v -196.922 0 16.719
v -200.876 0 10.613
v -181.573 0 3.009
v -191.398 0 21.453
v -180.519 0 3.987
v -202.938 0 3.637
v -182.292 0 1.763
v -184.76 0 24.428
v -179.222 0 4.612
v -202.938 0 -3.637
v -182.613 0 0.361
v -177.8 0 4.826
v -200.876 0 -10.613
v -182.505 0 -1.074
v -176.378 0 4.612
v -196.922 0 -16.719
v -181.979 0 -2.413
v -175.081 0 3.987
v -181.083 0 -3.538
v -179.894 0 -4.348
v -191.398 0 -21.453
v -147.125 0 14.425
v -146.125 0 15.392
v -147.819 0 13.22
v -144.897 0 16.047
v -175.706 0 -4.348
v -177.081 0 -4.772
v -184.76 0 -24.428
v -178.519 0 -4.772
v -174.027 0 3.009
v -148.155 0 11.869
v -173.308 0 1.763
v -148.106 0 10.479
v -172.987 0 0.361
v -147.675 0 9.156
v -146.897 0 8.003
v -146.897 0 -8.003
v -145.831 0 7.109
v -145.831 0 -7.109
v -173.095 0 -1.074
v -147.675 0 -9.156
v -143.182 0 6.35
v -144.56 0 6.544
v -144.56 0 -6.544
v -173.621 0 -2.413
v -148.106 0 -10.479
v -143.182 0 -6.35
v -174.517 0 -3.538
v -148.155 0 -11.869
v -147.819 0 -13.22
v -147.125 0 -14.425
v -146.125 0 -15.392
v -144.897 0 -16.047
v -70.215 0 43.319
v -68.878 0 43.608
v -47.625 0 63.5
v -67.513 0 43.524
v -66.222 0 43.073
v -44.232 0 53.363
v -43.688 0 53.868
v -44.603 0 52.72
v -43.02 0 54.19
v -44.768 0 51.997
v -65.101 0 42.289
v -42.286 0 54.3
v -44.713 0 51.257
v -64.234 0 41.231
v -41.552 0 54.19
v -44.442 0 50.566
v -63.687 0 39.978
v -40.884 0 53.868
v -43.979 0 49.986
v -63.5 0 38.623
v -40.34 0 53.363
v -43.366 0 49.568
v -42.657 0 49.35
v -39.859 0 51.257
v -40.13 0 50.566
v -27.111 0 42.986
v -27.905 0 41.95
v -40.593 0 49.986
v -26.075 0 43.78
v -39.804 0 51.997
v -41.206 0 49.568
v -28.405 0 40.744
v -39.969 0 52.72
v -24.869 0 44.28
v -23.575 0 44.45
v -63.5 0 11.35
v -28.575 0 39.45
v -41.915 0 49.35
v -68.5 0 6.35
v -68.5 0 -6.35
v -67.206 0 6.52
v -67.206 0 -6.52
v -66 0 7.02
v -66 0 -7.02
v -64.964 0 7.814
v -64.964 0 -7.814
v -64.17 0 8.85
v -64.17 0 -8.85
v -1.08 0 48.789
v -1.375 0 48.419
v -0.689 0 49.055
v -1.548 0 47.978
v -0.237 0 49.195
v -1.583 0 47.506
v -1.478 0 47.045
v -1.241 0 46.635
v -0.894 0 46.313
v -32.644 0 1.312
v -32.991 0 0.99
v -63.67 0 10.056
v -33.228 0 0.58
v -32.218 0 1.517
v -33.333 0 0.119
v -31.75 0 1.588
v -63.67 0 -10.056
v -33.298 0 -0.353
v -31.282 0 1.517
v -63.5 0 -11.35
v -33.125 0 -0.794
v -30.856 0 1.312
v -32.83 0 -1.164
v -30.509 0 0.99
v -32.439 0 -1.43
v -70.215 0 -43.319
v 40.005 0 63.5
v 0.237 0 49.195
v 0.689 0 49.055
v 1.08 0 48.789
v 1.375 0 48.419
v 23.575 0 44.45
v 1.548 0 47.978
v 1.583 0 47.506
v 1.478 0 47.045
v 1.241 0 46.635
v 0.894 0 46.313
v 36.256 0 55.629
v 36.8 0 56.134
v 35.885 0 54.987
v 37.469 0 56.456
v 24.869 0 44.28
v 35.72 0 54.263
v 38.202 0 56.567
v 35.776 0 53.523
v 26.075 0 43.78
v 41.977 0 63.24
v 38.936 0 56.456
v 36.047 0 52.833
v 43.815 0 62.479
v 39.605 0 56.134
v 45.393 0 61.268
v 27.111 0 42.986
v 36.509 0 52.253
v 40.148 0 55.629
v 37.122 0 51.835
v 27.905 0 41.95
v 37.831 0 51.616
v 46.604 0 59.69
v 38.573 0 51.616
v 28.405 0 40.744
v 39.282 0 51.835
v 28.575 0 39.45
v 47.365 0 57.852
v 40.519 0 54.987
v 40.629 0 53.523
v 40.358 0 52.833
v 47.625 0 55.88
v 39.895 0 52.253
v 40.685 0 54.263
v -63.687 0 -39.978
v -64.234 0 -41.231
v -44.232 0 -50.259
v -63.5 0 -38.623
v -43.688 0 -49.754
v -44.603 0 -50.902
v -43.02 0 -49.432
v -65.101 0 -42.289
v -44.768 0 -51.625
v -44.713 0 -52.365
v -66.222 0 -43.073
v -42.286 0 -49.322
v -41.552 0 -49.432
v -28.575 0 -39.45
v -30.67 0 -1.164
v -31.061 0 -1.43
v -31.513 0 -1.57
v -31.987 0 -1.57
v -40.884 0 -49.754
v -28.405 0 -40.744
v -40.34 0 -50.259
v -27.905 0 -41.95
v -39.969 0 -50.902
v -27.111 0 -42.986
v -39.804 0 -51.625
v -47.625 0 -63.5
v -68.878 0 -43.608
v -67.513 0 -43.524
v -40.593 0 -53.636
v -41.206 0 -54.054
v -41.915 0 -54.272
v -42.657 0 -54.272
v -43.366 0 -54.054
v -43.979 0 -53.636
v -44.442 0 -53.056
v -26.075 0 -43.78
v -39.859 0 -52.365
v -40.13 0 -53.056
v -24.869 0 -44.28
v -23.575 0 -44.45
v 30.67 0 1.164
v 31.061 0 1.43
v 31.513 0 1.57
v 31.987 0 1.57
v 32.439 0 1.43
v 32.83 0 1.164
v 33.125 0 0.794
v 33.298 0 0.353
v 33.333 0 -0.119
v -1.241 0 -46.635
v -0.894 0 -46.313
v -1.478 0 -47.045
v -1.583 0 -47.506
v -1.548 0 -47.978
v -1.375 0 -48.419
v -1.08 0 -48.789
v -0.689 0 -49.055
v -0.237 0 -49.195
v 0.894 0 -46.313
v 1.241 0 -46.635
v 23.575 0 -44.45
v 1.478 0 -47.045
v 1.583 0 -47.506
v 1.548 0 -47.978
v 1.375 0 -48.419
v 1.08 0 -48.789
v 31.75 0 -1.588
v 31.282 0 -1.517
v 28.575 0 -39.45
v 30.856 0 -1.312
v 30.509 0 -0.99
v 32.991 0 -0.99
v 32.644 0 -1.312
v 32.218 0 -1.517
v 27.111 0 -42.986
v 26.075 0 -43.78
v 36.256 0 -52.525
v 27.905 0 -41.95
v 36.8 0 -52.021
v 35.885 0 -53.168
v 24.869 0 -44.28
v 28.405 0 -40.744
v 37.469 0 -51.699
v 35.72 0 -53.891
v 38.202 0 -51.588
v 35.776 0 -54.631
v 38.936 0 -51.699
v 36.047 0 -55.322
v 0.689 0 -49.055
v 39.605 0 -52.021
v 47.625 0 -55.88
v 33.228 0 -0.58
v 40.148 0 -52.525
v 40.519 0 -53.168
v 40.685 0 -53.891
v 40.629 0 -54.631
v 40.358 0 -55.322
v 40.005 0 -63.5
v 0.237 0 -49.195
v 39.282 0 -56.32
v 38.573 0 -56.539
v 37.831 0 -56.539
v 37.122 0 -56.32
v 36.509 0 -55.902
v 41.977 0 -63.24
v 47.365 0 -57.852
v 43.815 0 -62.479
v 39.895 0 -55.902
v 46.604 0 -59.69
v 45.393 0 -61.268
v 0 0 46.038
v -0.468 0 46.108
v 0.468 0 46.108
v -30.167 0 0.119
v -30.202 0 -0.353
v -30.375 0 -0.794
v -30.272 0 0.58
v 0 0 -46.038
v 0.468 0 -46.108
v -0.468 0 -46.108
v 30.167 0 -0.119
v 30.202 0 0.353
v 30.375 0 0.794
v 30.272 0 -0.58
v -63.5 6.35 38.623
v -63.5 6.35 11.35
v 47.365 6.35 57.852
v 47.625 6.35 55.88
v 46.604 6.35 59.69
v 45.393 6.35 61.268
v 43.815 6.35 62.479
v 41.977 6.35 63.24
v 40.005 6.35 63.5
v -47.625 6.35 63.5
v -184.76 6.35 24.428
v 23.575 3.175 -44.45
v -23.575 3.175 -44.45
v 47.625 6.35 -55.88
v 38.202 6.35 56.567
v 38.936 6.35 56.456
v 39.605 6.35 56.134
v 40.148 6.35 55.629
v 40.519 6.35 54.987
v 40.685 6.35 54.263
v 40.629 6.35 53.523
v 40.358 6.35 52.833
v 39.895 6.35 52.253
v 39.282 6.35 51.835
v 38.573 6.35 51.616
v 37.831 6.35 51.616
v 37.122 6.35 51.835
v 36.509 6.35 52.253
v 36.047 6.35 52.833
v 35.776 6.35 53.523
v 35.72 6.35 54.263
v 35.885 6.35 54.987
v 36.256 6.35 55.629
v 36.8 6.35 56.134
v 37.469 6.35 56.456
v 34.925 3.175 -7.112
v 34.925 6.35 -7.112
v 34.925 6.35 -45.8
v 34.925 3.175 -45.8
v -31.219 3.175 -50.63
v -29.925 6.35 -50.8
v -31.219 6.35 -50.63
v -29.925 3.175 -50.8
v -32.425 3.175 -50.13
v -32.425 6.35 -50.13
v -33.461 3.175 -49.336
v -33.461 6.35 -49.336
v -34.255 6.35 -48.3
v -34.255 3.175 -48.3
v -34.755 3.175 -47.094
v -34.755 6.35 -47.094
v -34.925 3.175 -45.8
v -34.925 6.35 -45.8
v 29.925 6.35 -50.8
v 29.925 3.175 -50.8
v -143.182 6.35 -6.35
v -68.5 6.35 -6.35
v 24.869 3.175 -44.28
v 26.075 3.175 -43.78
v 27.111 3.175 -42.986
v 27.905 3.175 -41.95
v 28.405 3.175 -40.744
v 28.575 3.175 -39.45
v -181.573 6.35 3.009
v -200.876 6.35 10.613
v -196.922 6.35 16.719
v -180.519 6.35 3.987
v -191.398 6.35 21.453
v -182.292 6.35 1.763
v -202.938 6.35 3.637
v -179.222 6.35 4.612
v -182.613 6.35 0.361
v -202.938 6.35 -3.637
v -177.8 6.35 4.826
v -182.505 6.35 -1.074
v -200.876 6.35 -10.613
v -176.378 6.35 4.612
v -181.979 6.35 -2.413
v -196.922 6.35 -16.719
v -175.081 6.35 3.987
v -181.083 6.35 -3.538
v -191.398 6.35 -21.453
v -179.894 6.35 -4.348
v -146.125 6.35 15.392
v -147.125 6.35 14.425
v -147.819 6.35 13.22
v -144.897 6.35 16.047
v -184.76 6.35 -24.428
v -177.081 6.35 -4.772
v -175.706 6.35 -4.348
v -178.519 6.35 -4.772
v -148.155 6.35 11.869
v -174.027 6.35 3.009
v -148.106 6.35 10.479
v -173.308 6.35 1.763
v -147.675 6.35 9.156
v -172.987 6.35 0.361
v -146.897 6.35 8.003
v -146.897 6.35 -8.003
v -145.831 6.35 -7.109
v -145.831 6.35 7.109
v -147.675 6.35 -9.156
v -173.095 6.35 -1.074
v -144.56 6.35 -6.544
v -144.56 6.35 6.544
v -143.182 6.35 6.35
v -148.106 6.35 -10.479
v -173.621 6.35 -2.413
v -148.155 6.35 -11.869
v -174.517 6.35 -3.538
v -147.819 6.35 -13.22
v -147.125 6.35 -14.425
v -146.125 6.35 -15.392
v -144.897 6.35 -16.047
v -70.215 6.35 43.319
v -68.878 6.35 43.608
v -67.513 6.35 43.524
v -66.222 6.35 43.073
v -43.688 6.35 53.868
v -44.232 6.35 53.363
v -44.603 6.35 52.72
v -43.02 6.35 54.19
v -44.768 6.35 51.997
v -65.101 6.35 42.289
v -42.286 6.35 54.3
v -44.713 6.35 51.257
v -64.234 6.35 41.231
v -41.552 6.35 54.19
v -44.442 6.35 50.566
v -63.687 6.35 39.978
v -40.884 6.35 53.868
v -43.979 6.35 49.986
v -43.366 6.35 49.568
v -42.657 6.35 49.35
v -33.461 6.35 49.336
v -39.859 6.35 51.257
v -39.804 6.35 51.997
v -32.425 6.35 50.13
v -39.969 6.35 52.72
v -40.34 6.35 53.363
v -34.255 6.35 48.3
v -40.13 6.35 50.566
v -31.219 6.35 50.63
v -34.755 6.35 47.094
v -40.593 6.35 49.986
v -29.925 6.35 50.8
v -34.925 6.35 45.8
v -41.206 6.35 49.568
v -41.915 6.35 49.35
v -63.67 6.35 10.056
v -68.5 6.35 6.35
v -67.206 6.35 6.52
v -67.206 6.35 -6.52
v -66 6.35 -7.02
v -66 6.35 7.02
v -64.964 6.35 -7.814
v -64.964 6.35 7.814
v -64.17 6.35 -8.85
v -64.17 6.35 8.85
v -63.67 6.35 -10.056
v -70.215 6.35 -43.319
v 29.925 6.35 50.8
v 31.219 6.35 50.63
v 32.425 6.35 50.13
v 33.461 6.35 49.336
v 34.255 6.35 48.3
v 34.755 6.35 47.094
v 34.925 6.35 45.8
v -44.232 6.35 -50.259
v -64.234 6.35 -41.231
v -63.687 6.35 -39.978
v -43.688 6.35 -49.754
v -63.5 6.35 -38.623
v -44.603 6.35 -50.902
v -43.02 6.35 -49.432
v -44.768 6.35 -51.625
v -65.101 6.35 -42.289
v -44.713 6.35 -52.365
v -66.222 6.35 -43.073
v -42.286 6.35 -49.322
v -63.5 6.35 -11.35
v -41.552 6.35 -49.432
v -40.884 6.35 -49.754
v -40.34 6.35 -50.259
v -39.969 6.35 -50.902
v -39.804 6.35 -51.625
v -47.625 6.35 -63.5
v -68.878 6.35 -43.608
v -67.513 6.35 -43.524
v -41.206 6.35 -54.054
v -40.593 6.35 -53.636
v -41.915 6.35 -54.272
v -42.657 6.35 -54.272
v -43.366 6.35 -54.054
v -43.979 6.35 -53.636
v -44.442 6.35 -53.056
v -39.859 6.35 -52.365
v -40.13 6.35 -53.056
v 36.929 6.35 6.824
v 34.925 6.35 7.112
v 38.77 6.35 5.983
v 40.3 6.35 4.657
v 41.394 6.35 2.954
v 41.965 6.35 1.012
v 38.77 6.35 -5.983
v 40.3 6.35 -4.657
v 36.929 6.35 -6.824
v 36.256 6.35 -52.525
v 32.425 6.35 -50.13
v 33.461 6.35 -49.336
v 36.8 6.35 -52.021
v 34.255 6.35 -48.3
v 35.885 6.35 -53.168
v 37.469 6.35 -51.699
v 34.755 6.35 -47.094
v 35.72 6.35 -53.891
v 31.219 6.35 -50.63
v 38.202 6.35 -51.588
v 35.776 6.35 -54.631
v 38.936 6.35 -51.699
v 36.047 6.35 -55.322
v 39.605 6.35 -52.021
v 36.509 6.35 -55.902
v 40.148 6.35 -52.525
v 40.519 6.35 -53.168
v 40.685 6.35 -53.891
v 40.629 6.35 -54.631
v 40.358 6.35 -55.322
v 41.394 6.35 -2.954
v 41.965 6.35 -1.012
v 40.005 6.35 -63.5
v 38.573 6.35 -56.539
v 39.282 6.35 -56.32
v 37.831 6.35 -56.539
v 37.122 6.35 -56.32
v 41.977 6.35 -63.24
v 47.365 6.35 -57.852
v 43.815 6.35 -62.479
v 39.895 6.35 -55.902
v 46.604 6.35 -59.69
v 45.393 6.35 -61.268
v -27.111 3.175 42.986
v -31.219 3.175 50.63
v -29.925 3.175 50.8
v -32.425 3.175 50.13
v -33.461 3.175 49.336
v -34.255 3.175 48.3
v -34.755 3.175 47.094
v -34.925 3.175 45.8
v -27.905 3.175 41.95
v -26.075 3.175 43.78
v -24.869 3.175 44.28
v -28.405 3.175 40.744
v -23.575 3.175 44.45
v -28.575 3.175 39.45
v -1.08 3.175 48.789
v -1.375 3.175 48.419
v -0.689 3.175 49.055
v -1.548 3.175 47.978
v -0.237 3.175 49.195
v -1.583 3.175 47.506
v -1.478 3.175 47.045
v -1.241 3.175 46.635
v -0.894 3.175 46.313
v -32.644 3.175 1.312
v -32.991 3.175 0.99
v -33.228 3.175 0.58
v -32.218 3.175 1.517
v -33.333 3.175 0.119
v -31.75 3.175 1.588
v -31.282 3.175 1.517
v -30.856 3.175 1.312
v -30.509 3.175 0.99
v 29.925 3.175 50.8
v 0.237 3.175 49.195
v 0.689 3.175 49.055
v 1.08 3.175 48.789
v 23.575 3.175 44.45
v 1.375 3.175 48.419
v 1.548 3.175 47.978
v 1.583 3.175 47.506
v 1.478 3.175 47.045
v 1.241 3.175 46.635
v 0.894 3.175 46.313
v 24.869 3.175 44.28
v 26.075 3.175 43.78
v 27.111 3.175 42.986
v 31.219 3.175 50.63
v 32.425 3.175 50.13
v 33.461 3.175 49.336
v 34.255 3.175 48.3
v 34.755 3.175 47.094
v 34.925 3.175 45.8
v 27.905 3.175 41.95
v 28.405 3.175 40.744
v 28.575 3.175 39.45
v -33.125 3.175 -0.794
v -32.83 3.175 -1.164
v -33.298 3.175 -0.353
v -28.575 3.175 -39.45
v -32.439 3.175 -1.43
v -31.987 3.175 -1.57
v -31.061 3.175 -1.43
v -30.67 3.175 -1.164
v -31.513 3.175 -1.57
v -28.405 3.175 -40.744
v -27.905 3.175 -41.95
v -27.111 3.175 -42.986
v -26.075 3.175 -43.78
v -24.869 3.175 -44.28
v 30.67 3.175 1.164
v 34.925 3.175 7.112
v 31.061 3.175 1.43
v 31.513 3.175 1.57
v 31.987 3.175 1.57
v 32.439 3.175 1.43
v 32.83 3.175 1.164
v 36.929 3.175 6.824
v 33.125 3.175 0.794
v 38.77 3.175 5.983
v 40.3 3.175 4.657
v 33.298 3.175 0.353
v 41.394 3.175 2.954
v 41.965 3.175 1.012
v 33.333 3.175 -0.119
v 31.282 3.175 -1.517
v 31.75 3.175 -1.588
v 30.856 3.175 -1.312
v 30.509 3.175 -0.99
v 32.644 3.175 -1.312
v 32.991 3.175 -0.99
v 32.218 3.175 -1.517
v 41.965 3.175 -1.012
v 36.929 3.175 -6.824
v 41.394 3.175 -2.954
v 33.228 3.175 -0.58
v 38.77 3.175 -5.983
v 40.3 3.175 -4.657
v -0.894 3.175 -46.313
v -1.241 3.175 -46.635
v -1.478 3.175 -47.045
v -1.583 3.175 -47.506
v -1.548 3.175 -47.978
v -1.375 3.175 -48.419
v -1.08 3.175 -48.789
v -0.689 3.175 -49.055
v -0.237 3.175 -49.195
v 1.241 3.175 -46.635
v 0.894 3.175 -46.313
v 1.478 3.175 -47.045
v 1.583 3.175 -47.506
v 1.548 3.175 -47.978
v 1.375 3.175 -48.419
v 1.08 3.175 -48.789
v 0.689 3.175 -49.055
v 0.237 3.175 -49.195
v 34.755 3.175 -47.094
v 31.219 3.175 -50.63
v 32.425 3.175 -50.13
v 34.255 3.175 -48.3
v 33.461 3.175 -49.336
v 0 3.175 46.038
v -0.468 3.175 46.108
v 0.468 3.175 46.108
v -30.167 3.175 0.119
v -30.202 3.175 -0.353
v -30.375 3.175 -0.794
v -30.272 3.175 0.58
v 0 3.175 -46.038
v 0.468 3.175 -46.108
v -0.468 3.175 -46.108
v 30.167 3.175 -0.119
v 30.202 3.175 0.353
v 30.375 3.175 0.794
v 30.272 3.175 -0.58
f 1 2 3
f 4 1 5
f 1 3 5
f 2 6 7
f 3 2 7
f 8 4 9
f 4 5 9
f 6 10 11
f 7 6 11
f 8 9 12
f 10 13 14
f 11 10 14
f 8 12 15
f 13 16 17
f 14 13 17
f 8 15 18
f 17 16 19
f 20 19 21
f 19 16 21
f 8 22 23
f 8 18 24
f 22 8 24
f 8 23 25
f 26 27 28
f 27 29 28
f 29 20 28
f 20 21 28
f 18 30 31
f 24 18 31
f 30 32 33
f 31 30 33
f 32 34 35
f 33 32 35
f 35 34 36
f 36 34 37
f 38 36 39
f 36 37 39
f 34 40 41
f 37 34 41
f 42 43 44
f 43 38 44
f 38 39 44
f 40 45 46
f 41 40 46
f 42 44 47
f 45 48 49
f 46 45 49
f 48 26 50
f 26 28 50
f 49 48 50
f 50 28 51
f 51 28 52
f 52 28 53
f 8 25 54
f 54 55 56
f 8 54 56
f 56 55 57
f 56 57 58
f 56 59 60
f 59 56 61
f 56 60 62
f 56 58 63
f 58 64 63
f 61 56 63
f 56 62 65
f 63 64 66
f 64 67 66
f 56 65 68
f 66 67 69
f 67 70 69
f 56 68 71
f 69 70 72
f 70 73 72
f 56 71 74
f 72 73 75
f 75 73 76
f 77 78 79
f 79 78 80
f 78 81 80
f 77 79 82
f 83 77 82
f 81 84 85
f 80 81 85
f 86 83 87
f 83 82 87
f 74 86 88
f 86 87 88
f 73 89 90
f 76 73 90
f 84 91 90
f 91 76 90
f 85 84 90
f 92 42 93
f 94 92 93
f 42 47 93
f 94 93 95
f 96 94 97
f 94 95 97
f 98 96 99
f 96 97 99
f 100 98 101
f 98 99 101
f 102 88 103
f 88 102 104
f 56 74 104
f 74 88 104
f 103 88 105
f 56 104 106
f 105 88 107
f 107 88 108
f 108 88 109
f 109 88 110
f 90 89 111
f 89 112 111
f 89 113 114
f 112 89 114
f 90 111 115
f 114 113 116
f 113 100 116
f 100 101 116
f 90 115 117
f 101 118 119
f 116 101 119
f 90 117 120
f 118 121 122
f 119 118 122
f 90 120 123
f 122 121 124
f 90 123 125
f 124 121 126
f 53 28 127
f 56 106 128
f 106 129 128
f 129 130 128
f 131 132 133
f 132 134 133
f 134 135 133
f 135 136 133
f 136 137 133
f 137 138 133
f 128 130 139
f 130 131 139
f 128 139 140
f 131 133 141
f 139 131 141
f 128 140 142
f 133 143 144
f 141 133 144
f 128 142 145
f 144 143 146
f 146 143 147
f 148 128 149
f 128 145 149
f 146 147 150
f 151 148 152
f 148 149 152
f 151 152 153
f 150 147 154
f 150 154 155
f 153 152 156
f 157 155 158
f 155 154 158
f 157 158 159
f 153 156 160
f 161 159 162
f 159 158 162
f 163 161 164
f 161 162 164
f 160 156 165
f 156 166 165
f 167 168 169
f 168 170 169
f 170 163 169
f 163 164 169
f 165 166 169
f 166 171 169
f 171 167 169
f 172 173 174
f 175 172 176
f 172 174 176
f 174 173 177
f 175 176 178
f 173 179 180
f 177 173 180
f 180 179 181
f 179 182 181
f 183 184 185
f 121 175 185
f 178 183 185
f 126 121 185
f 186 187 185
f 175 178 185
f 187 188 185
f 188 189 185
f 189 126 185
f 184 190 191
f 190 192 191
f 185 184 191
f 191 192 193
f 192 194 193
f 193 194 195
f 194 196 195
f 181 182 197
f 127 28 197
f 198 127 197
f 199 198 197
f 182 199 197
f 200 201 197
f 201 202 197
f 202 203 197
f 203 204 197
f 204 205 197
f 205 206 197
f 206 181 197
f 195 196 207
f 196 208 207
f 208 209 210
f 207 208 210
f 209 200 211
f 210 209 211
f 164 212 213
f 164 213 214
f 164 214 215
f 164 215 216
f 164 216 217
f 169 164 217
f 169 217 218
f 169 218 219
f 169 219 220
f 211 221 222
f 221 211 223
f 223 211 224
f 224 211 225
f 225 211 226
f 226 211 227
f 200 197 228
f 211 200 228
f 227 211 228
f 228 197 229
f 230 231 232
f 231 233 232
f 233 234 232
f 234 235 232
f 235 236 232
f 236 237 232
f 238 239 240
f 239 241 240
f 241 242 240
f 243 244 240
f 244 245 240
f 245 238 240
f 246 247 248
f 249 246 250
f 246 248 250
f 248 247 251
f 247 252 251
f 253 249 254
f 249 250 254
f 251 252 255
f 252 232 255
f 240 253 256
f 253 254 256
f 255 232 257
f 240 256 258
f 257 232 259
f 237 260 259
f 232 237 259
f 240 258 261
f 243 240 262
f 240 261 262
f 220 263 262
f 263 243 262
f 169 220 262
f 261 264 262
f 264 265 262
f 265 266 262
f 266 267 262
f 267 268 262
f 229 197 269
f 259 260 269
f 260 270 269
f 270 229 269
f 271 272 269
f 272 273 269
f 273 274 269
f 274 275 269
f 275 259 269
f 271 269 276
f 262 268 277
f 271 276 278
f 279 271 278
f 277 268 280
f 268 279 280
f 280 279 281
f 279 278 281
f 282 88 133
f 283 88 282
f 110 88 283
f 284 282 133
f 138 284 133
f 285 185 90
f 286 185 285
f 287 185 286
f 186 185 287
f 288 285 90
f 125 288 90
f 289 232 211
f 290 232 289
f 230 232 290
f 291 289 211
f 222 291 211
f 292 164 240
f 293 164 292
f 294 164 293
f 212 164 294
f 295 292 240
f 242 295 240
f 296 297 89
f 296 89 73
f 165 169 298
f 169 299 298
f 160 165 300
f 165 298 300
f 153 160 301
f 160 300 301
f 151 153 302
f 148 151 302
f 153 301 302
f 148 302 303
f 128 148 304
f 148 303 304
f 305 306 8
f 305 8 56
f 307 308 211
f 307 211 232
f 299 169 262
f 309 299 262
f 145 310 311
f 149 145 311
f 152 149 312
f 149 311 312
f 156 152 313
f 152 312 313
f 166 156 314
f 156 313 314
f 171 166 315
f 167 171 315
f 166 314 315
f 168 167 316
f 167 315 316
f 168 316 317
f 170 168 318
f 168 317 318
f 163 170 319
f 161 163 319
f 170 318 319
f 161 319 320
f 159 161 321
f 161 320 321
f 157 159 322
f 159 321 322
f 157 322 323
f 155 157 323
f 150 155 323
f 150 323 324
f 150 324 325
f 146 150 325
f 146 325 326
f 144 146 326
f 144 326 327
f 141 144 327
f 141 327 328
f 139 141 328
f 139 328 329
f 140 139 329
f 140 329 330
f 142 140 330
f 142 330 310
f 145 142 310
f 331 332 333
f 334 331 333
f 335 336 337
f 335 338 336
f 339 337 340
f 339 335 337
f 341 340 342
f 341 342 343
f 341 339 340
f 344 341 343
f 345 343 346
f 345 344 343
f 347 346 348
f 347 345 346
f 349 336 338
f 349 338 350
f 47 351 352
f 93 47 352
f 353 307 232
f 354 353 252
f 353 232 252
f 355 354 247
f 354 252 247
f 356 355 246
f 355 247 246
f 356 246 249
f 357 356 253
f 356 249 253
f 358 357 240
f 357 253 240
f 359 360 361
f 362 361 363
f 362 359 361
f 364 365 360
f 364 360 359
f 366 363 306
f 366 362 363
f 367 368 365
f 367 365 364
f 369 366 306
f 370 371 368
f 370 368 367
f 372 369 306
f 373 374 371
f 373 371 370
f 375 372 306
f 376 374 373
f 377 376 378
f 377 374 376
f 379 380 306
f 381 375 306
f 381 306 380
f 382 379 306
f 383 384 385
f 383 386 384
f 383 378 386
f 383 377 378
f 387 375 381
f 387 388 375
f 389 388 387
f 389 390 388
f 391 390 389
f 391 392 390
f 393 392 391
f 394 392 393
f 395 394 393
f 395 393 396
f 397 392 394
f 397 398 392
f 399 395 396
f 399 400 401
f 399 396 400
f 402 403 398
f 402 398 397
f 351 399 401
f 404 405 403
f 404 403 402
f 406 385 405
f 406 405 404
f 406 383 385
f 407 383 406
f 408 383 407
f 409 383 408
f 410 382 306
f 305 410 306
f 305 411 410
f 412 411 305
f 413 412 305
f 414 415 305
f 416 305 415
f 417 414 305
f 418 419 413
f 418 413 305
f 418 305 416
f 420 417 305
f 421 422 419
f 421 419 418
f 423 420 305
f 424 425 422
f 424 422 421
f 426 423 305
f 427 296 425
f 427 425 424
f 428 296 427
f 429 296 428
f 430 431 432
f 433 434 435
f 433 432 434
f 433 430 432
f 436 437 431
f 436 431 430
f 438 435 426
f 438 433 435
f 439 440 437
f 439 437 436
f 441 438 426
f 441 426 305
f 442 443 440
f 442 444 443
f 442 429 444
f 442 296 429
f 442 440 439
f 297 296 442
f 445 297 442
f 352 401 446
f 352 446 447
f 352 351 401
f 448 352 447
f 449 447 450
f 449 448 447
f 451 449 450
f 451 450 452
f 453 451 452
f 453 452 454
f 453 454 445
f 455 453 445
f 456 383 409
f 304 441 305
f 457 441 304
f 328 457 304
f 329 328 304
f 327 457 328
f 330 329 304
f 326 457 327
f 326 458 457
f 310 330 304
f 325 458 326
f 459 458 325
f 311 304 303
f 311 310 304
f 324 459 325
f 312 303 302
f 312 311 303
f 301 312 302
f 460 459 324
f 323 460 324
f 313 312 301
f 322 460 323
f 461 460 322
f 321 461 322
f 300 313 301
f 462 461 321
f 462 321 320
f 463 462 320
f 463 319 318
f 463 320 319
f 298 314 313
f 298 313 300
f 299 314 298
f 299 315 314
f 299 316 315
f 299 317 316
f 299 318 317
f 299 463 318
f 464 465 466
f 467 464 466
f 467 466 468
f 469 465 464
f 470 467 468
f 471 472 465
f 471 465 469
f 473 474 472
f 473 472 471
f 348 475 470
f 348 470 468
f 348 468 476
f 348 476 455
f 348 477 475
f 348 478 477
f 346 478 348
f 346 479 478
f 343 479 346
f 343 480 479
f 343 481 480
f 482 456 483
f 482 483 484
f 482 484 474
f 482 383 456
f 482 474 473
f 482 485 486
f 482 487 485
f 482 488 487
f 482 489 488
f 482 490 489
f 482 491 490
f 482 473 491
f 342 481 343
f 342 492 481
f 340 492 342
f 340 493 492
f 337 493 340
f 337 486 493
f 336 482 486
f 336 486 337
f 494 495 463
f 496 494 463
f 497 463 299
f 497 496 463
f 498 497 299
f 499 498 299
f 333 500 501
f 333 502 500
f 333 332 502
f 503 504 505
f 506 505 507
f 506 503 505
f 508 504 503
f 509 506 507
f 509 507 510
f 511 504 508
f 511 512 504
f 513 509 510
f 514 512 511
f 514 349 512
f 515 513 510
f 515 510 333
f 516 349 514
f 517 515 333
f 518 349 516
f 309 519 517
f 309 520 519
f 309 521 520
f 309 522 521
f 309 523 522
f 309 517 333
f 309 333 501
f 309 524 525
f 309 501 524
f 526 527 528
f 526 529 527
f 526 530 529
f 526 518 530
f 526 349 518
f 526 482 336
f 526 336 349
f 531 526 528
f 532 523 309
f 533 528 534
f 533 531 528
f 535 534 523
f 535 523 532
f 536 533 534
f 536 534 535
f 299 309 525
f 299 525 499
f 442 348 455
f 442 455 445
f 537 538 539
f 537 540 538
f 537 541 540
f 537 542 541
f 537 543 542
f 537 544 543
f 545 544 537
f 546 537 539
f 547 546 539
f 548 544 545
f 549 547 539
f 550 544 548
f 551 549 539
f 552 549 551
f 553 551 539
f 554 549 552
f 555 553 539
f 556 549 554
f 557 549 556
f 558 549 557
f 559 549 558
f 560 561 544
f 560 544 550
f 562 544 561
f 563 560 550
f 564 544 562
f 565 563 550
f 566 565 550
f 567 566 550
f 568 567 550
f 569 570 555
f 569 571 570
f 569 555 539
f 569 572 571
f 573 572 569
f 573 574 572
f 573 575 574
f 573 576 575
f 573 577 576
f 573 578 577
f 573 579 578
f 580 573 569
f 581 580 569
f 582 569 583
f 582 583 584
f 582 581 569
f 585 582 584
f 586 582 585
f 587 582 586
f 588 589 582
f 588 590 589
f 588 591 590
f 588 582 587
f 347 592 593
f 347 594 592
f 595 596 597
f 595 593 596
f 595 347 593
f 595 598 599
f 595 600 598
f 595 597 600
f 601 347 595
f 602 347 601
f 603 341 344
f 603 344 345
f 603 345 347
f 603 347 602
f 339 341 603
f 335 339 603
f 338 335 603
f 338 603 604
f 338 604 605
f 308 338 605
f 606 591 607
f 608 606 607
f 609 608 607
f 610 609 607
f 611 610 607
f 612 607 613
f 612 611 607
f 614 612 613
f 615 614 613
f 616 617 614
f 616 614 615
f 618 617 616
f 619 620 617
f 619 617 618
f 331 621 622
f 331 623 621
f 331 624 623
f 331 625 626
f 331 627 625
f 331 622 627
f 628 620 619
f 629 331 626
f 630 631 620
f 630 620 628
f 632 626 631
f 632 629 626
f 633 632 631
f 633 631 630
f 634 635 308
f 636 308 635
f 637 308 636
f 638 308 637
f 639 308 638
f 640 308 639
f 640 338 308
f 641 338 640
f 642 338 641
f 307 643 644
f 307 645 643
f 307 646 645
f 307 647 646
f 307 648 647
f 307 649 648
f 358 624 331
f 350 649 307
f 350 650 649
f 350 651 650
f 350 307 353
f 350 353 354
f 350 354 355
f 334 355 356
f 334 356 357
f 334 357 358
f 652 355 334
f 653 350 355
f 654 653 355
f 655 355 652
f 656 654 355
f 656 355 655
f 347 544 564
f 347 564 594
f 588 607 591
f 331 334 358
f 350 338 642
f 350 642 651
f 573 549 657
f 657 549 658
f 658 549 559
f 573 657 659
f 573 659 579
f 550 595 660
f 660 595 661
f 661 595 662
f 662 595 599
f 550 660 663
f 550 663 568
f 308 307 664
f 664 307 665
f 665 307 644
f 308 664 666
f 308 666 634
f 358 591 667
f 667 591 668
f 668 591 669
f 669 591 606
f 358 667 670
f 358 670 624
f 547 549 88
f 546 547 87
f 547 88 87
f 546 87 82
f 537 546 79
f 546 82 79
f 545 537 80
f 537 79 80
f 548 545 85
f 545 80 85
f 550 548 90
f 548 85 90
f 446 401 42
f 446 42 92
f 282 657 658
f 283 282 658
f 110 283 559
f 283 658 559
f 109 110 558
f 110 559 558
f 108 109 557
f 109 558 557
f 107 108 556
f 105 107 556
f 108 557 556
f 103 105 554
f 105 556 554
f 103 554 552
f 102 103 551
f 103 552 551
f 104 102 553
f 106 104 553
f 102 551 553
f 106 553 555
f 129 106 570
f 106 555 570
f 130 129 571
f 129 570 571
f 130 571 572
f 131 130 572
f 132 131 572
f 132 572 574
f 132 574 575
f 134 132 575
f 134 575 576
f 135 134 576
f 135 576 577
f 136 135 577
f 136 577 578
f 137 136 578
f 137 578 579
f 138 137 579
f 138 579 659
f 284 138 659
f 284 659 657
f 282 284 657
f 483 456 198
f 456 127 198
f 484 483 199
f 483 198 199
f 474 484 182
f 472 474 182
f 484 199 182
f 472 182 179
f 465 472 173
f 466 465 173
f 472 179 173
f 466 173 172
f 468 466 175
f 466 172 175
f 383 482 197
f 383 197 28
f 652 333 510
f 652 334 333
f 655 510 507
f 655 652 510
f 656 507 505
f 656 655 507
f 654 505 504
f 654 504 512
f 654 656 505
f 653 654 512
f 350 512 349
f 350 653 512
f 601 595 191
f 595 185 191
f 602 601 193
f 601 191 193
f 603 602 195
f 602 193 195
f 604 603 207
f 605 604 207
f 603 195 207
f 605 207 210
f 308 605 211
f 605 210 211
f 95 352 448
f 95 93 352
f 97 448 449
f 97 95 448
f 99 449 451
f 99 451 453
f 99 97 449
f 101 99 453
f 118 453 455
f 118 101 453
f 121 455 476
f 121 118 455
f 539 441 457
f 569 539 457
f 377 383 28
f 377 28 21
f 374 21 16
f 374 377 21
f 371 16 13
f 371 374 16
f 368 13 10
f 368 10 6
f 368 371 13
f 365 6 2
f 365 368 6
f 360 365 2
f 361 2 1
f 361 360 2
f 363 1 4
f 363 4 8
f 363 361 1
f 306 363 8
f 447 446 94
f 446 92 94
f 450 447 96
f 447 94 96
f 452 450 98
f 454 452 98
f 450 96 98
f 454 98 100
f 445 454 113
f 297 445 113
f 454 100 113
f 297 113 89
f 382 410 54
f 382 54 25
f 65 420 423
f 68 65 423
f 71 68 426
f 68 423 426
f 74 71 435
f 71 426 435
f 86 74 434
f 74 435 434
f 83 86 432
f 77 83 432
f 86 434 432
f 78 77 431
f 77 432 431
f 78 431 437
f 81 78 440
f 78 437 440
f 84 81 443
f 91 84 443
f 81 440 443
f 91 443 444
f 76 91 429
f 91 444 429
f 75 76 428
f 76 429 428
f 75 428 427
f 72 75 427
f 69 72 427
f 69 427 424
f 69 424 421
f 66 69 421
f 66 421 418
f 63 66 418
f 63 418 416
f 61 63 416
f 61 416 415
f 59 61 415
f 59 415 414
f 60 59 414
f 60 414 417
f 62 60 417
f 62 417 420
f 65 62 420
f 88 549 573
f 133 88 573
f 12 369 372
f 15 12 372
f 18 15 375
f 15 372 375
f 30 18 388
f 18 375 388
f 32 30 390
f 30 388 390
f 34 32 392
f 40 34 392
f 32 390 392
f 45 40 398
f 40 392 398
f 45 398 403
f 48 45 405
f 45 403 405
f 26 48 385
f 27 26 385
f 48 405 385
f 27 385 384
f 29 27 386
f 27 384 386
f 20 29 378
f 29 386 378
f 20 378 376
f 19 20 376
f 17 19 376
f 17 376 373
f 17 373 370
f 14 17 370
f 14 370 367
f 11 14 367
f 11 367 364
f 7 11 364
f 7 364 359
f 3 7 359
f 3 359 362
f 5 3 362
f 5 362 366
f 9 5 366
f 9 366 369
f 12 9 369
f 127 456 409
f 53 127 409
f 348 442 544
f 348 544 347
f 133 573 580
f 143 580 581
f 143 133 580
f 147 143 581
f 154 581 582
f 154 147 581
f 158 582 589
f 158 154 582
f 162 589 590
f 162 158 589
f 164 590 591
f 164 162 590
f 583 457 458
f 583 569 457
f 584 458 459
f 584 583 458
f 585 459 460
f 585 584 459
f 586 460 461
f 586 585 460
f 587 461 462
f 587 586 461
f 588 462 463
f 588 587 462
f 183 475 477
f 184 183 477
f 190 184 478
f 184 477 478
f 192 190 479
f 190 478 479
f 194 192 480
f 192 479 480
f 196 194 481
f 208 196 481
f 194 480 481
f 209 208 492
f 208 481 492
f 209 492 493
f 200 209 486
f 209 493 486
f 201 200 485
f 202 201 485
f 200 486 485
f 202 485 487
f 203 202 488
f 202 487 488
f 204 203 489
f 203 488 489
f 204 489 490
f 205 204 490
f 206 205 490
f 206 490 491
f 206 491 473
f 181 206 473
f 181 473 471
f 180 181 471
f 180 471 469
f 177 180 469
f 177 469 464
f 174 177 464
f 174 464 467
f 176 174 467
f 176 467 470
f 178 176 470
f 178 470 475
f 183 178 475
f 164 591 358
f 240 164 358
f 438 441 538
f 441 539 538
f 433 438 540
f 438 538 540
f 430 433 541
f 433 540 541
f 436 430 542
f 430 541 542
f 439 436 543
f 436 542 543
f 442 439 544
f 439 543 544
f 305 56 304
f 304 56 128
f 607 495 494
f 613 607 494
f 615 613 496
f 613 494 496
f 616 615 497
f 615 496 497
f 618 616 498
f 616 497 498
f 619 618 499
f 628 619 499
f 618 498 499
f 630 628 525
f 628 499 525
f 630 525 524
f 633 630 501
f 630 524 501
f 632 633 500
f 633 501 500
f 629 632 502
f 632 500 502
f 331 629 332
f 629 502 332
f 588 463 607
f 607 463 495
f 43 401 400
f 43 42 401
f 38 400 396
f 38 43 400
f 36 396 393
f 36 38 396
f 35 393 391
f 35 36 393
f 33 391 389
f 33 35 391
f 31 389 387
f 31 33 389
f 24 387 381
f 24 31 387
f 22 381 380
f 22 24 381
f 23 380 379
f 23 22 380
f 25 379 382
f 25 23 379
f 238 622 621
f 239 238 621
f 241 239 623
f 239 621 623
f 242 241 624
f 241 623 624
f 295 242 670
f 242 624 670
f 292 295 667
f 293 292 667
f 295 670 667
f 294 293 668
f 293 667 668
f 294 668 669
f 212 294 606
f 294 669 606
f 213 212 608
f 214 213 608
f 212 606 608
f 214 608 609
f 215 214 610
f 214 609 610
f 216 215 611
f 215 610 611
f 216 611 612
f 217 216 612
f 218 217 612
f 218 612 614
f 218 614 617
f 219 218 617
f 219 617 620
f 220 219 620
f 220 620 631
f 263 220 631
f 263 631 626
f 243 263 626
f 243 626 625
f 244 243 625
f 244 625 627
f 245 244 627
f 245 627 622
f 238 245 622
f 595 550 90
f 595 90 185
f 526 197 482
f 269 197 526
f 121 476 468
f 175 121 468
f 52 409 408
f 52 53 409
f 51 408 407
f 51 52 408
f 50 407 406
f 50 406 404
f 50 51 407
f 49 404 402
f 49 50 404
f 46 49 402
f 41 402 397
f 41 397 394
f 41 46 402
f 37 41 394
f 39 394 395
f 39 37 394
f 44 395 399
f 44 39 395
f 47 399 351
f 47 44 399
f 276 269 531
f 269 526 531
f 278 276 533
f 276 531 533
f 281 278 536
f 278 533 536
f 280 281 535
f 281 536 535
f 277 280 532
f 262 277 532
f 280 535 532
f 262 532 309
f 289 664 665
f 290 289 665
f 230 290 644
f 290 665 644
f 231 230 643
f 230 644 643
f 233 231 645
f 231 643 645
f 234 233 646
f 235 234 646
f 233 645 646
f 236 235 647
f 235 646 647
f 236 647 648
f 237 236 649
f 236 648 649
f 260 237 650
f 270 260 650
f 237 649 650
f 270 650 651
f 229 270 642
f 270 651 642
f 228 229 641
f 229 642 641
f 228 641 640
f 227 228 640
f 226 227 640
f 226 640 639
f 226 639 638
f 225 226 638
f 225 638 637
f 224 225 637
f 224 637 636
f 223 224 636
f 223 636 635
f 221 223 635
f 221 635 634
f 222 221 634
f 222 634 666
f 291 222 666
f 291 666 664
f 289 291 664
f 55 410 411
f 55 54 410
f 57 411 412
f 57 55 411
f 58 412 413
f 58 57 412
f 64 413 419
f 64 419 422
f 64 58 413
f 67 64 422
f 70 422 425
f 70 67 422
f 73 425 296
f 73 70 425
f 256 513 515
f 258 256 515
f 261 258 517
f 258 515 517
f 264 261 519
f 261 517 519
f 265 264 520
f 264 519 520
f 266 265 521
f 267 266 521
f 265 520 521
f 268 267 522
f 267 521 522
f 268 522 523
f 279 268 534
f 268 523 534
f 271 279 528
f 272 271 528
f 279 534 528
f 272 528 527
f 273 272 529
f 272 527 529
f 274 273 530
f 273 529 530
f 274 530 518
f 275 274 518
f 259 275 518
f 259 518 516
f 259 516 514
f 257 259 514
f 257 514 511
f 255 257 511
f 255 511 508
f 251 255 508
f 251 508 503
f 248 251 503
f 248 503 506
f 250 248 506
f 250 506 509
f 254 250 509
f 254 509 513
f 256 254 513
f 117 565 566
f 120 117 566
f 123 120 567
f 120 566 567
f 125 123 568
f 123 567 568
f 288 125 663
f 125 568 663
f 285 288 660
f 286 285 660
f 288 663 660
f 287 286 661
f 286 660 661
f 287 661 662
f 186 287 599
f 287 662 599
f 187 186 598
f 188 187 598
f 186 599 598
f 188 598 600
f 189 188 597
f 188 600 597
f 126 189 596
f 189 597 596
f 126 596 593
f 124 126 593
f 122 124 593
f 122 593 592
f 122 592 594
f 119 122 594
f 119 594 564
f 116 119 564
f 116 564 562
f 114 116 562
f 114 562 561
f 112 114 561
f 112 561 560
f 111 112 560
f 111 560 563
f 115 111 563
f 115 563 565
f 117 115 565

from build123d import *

# Parameters (mm, degrees)
SKETCH1_W           = 95.25
SKETCH1_H           = 127
BOSS_EXTRUDE1_DEPTH = 6.35
BOSS_EXTRUDE3_DEPTH = 6.35
SKETCH5_R           = 4.826
CUT_EXTRUDE1_DEPTH  = 213.985474857
CUT_EXTRUDE2_DEPTH  = 213.985474857
FILLET9_R           = 5
SKETCH7_R           = 5.453804141
BOSS_EXTRUDE4_DEPTH = 6.35
SKETCH8_W           = 69.85
SKETCH8_H           = 101.6
CUT_EXTRUDE3_DEPTH  = 3.175
SKETCH9_W           = 57.15
SKETCH9_H           = 88.9
CUT_EXTRUDE4_DEPTH  = 213.914467862
SKETCH11_R          = 1.5875
CUT_EXTRUDE6_DEPTH  = 213.914467862
CUT_EXTRUDE7_DEPTH  = 3.175
FILLET10_R          = 5
FILLET11_R          = 5
FILLET12_R          = 7.62
SKETCH13_R          = 2.4892
CUT_EXTRUDE8_DEPTH  = 213.985474857


with BuildPart() as part:
    # Sketch1 → Boss-Extrude1 (new body)
    with BuildSketch(Plane(origin=(0, 0, 0), x_dir=(1, 0, 0), z_dir=(0, 1, 0))):
        Rectangle(SKETCH1_W, SKETCH1_H)
    extrude(amount=BOSS_EXTRUDE1_DEPTH)

    # Sketch4 → Boss-Extrude3 (add)
    with BuildSketch(Plane(origin=(0, 6.35, 0), x_dir=(1, 0, 0), z_dir=(0, 1, 0))):
        with BuildLine():
            Line((-47.625, 63.5), (-184.759922998, 24.427842145))
            ThreePointArc((-184.759922998, 24.427842145), (-203.2, 0), (-184.759922998, -24.427842145))
            Line((-184.759922998, -24.427842145), (-47.625, -63.5))
            Line((-47.625, -63.5), (-47.625, 63.5))
        make_face()
    extrude(amount=-BOSS_EXTRUDE3_DEPTH)

    # Sketch5 → Cut-Extrude1 (cut, through all)
    with BuildSketch(Plane(origin=(0, 6.35, 0), x_dir=(1, 0, 0), z_dir=(0, 1, 0))):
        with Locations(Location((-177.8, 0, 0), (0, 0, 270))):
            Circle(SKETCH5_R)
        with Locations(Location((-22.225, 0, 0), (0, 0, 270))):
            Circle(SKETCH5_R)
    extrude(amount=-CUT_EXTRUDE1_DEPTH, mode=Mode.SUBTRACT)

    # Sketch6 → Cut-Extrude2 (cut, through all)
    with BuildSketch(Plane(origin=(0, 6.35, 0), x_dir=(1, 0, 0), z_dir=(0, 1, 0))):
        Polygon((-63.5, 45.771509083), (-171.45, 6.35), (-63.5, 6.35), align=None)
        Polygon((-63.5, -6.35), (-63.5, -45.771509083), (-171.45, -6.35), align=None)
    extrude(amount=-CUT_EXTRUDE2_DEPTH, mode=Mode.SUBTRACT)

    # Fillet9
    fillet9_edges = [part.edges().sort_by_distance(p)[0] for p in [
        (-63.5, 3.175, -45.771509083),
        (-63.5, 3.175, -6.35),
        (-171.45, 3.175, -6.35),
        (-171.45, 3.175, 6.35),
        (-63.5, 3.175, 6.35),
        (-63.5, 3.175, 45.771509083),
    ]]
    fillet(fillet9_edges, radius=FILLET9_R)

    # Sketch7 → Boss-Extrude4 (add)
    with BuildSketch(Plane(origin=(0, 6.35, 0), x_dir=(1, 0, 0), z_dir=(0, 1, 0))):
        with Locations((-22.225, 0)):
            Circle(SKETCH7_R)
    extrude(amount=-BOSS_EXTRUDE4_DEPTH)

    # Sketch8 → Cut-Extrude3 (cut)
    with BuildSketch(Plane(origin=(0, 6.35, 0), x_dir=(1, 0, 0), z_dir=(0, 1, 0))):
        Rectangle(SKETCH8_W, SKETCH8_H)
    extrude(amount=-CUT_EXTRUDE3_DEPTH, mode=Mode.SUBTRACT)

    # Sketch9 → Cut-Extrude4 (cut, through all)
    with BuildSketch(Plane(origin=(0, 3.175, 0), x_dir=(1, 0, 0), z_dir=(0, 1, 0))):
        Rectangle(SKETCH9_W, SKETCH9_H)
    extrude(amount=-CUT_EXTRUDE4_DEPTH, mode=Mode.SUBTRACT)

    # Sketch11 → Cut-Extrude6 (cut, through all)
    with BuildSketch(Plane(origin=(0, 3.175, 0), x_dir=(1, 0, 0), z_dir=(0, 1, 0))):
        with Locations(Location((-31.75, 0, 0), (0, 0, 270))):
            Circle(SKETCH11_R)
        with Locations(Location((31.75, 0, 0), (0, 0, 90))):
            Circle(SKETCH11_R)
        with Locations(Location((0, 47.625, 0), (0, 0, 270))):
            Circle(SKETCH11_R)
        with Locations(Location((0, -47.625, 0), (0, 0, 90))):
            Circle(SKETCH11_R)
    extrude(amount=-CUT_EXTRUDE6_DEPTH, mode=Mode.SUBTRACT)

    # Sketch12 → Cut-Extrude7 (cut)
    with BuildSketch(Plane(origin=(0, 6.35, 0), x_dir=(1, 0, 0), z_dir=(0, 1, 0))):
        with BuildLine():
            Line((34.925, 7.112), (34.925, -7.112))
            ThreePointArc((34.925, -7.112), (42.037, 0), (34.925, 7.112))
        make_face()
    extrude(amount=-CUT_EXTRUDE7_DEPTH, mode=Mode.SUBTRACT)

    # Fillet10
    fillet10_edges = [part.edges().sort_by_distance(p)[0] for p in [
        (-34.925, 4.7625, -50.8),
        (34.925, 4.7625, -50.8),
        (34.925, 4.7625, 50.8),
        (-34.925, 4.7625, 50.8),
    ]]
    fillet(fillet10_edges, radius=FILLET10_R)

    # Fillet11
    fillet11_edges = [part.edges().sort_by_distance(p)[0] for p in [
        (-28.575, 1.5875, 44.45),
        (-28.575, 1.5875, -44.45),
        (28.575, 1.5875, -44.45),
        (28.575, 1.5875, 44.45),
    ]]
    fillet(fillet11_edges, radius=FILLET11_R)

    # Fillet12
    fillet12_edges = [part.edges().sort_by_distance(p)[0] for p in [
        (47.625, 3.175, 63.5),
        (47.625, 3.175, -63.5),
    ]]
    fillet(fillet12_edges, radius=FILLET12_R)

    # Sketch13 → Cut-Extrude8 (cut, through all)
    with BuildSketch(Plane(origin=(0, 6.35, 0), x_dir=(1, 0, 0), z_dir=(0, 1, 0))):
        with Locations(Location((-42.286053483, 51.811053483, 0), (0, 0, 270))):
            Circle(SKETCH13_R)
        with Locations(Location((-42.286053483, -51.811053483, 0), (0, 0, 270))):
            Circle(SKETCH13_R)
        with Locations(Location((38.202339924, -54.077339924, 0), (0, 0, 270))):
            Circle(SKETCH13_R)
        with Locations(Location((38.202339924, 54.077339924, 0), (0, 0, 270))):
            Circle(SKETCH13_R)
    extrude(amount=-CUT_EXTRUDE8_DEPTH, mode=Mode.SUBTRACT)


solid = part.part
